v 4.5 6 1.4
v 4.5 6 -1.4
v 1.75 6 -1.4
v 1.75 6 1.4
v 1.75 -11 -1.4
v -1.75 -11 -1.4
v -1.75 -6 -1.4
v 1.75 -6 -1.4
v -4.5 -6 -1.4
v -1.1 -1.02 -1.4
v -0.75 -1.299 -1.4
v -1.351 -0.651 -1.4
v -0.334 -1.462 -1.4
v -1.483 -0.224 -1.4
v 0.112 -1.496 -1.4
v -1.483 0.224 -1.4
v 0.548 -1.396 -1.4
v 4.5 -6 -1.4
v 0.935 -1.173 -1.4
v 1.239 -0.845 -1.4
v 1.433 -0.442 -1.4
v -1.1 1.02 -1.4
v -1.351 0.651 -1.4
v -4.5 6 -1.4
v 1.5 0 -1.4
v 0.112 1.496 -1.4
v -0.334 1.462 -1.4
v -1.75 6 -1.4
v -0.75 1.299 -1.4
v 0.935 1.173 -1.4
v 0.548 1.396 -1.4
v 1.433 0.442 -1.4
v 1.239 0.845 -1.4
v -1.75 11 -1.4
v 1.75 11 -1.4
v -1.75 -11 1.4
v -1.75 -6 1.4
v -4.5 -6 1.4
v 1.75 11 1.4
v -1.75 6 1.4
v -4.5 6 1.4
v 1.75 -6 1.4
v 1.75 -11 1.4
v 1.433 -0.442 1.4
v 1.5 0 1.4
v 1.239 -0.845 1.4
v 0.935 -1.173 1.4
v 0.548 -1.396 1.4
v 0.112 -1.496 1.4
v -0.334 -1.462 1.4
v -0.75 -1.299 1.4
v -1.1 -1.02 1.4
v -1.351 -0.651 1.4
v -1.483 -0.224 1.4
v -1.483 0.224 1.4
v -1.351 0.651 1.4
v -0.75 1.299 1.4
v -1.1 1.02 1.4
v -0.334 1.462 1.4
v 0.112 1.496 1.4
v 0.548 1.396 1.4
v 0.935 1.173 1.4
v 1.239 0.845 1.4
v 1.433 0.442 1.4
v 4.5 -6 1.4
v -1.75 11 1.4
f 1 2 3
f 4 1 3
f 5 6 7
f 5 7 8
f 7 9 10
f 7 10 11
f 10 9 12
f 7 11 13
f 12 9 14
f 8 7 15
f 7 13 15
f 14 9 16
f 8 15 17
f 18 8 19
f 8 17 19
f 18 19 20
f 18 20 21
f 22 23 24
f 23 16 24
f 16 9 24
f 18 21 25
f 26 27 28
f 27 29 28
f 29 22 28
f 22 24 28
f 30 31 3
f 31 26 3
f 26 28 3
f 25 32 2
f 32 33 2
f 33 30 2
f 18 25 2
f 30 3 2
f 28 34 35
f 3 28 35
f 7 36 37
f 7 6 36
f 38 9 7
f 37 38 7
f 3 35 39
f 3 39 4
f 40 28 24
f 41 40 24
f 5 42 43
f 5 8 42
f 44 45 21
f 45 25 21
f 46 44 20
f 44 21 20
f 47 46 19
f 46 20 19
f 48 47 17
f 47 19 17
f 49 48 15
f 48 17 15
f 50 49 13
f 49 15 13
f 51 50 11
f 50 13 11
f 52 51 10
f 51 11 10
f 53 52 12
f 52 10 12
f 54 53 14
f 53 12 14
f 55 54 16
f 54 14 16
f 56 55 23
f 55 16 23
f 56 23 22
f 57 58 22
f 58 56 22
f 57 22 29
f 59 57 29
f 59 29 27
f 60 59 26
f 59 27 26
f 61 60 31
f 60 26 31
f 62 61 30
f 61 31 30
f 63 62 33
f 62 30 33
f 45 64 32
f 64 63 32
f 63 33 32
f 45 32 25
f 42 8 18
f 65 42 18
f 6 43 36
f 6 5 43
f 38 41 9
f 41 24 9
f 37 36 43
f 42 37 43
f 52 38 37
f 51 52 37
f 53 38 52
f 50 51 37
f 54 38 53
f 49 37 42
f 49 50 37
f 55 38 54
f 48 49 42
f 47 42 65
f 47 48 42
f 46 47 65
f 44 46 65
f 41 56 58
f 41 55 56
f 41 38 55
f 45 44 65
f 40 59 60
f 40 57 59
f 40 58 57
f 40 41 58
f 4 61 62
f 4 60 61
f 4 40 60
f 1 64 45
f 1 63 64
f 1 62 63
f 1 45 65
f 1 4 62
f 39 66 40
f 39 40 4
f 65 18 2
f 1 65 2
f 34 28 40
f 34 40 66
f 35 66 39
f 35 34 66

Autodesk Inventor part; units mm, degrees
ref_plane "YZ Plane" through (0, 0, 0) normal (1, 0, 0) x (0, 1, 0)
ref_plane "XZ Plane" through (0, 0, 0) normal (0, 1, 0) x (-1, 0, 0)
ref_plane "XY Plane" through (0, 0, 0) normal (0, 0, 1) x (1, 0, 0)
sketch "Sketch1" plane through (0, 0, 0) normal (0, 0, 1) x (1, 0, 0)
  line L0 (-4.5, -6) -> (4.5, -6)
  line L1 (4.5, -6) -> (4.5, 6)
  line L2 (4.5, 6) -> (-4.5, 6)
  line L3 (-4.5, 6) -> (-4.5, -6)
  line L4 (-1.75, 11) -> (1.75, 11)
  line L5 (1.75, -11) -> (-1.75, -11)
  circle A0 centre (0, 0) radius 1.5
  line L6 (1.75, 11) -> (1.75, 6)
  line L7 (1.75, -6) -> (1.75, -11)
  line L8 (-1.75, -11) -> (-1.75, -6)
  line L9 (-1.75, 6) -> (-1.75, 11)
  dimension "d0" = 3
  dimension "d1" = 12
  dimension "d2" = 9
  dimension "d3" = 3.5
  dimension "d4" = 11
  dimension "d5" = 22
  dimension "d6" = 1.75
  dimension "d7" = 4.5
extrude "Extrusion1" add sketch "Sketch1" along normal mid plane 2.8
equation "\"d4\" = 0.5 * d5"
equation "\"d6\" = 0.5 * d3"
equation "\"d7\" = 0.5 * d2"
